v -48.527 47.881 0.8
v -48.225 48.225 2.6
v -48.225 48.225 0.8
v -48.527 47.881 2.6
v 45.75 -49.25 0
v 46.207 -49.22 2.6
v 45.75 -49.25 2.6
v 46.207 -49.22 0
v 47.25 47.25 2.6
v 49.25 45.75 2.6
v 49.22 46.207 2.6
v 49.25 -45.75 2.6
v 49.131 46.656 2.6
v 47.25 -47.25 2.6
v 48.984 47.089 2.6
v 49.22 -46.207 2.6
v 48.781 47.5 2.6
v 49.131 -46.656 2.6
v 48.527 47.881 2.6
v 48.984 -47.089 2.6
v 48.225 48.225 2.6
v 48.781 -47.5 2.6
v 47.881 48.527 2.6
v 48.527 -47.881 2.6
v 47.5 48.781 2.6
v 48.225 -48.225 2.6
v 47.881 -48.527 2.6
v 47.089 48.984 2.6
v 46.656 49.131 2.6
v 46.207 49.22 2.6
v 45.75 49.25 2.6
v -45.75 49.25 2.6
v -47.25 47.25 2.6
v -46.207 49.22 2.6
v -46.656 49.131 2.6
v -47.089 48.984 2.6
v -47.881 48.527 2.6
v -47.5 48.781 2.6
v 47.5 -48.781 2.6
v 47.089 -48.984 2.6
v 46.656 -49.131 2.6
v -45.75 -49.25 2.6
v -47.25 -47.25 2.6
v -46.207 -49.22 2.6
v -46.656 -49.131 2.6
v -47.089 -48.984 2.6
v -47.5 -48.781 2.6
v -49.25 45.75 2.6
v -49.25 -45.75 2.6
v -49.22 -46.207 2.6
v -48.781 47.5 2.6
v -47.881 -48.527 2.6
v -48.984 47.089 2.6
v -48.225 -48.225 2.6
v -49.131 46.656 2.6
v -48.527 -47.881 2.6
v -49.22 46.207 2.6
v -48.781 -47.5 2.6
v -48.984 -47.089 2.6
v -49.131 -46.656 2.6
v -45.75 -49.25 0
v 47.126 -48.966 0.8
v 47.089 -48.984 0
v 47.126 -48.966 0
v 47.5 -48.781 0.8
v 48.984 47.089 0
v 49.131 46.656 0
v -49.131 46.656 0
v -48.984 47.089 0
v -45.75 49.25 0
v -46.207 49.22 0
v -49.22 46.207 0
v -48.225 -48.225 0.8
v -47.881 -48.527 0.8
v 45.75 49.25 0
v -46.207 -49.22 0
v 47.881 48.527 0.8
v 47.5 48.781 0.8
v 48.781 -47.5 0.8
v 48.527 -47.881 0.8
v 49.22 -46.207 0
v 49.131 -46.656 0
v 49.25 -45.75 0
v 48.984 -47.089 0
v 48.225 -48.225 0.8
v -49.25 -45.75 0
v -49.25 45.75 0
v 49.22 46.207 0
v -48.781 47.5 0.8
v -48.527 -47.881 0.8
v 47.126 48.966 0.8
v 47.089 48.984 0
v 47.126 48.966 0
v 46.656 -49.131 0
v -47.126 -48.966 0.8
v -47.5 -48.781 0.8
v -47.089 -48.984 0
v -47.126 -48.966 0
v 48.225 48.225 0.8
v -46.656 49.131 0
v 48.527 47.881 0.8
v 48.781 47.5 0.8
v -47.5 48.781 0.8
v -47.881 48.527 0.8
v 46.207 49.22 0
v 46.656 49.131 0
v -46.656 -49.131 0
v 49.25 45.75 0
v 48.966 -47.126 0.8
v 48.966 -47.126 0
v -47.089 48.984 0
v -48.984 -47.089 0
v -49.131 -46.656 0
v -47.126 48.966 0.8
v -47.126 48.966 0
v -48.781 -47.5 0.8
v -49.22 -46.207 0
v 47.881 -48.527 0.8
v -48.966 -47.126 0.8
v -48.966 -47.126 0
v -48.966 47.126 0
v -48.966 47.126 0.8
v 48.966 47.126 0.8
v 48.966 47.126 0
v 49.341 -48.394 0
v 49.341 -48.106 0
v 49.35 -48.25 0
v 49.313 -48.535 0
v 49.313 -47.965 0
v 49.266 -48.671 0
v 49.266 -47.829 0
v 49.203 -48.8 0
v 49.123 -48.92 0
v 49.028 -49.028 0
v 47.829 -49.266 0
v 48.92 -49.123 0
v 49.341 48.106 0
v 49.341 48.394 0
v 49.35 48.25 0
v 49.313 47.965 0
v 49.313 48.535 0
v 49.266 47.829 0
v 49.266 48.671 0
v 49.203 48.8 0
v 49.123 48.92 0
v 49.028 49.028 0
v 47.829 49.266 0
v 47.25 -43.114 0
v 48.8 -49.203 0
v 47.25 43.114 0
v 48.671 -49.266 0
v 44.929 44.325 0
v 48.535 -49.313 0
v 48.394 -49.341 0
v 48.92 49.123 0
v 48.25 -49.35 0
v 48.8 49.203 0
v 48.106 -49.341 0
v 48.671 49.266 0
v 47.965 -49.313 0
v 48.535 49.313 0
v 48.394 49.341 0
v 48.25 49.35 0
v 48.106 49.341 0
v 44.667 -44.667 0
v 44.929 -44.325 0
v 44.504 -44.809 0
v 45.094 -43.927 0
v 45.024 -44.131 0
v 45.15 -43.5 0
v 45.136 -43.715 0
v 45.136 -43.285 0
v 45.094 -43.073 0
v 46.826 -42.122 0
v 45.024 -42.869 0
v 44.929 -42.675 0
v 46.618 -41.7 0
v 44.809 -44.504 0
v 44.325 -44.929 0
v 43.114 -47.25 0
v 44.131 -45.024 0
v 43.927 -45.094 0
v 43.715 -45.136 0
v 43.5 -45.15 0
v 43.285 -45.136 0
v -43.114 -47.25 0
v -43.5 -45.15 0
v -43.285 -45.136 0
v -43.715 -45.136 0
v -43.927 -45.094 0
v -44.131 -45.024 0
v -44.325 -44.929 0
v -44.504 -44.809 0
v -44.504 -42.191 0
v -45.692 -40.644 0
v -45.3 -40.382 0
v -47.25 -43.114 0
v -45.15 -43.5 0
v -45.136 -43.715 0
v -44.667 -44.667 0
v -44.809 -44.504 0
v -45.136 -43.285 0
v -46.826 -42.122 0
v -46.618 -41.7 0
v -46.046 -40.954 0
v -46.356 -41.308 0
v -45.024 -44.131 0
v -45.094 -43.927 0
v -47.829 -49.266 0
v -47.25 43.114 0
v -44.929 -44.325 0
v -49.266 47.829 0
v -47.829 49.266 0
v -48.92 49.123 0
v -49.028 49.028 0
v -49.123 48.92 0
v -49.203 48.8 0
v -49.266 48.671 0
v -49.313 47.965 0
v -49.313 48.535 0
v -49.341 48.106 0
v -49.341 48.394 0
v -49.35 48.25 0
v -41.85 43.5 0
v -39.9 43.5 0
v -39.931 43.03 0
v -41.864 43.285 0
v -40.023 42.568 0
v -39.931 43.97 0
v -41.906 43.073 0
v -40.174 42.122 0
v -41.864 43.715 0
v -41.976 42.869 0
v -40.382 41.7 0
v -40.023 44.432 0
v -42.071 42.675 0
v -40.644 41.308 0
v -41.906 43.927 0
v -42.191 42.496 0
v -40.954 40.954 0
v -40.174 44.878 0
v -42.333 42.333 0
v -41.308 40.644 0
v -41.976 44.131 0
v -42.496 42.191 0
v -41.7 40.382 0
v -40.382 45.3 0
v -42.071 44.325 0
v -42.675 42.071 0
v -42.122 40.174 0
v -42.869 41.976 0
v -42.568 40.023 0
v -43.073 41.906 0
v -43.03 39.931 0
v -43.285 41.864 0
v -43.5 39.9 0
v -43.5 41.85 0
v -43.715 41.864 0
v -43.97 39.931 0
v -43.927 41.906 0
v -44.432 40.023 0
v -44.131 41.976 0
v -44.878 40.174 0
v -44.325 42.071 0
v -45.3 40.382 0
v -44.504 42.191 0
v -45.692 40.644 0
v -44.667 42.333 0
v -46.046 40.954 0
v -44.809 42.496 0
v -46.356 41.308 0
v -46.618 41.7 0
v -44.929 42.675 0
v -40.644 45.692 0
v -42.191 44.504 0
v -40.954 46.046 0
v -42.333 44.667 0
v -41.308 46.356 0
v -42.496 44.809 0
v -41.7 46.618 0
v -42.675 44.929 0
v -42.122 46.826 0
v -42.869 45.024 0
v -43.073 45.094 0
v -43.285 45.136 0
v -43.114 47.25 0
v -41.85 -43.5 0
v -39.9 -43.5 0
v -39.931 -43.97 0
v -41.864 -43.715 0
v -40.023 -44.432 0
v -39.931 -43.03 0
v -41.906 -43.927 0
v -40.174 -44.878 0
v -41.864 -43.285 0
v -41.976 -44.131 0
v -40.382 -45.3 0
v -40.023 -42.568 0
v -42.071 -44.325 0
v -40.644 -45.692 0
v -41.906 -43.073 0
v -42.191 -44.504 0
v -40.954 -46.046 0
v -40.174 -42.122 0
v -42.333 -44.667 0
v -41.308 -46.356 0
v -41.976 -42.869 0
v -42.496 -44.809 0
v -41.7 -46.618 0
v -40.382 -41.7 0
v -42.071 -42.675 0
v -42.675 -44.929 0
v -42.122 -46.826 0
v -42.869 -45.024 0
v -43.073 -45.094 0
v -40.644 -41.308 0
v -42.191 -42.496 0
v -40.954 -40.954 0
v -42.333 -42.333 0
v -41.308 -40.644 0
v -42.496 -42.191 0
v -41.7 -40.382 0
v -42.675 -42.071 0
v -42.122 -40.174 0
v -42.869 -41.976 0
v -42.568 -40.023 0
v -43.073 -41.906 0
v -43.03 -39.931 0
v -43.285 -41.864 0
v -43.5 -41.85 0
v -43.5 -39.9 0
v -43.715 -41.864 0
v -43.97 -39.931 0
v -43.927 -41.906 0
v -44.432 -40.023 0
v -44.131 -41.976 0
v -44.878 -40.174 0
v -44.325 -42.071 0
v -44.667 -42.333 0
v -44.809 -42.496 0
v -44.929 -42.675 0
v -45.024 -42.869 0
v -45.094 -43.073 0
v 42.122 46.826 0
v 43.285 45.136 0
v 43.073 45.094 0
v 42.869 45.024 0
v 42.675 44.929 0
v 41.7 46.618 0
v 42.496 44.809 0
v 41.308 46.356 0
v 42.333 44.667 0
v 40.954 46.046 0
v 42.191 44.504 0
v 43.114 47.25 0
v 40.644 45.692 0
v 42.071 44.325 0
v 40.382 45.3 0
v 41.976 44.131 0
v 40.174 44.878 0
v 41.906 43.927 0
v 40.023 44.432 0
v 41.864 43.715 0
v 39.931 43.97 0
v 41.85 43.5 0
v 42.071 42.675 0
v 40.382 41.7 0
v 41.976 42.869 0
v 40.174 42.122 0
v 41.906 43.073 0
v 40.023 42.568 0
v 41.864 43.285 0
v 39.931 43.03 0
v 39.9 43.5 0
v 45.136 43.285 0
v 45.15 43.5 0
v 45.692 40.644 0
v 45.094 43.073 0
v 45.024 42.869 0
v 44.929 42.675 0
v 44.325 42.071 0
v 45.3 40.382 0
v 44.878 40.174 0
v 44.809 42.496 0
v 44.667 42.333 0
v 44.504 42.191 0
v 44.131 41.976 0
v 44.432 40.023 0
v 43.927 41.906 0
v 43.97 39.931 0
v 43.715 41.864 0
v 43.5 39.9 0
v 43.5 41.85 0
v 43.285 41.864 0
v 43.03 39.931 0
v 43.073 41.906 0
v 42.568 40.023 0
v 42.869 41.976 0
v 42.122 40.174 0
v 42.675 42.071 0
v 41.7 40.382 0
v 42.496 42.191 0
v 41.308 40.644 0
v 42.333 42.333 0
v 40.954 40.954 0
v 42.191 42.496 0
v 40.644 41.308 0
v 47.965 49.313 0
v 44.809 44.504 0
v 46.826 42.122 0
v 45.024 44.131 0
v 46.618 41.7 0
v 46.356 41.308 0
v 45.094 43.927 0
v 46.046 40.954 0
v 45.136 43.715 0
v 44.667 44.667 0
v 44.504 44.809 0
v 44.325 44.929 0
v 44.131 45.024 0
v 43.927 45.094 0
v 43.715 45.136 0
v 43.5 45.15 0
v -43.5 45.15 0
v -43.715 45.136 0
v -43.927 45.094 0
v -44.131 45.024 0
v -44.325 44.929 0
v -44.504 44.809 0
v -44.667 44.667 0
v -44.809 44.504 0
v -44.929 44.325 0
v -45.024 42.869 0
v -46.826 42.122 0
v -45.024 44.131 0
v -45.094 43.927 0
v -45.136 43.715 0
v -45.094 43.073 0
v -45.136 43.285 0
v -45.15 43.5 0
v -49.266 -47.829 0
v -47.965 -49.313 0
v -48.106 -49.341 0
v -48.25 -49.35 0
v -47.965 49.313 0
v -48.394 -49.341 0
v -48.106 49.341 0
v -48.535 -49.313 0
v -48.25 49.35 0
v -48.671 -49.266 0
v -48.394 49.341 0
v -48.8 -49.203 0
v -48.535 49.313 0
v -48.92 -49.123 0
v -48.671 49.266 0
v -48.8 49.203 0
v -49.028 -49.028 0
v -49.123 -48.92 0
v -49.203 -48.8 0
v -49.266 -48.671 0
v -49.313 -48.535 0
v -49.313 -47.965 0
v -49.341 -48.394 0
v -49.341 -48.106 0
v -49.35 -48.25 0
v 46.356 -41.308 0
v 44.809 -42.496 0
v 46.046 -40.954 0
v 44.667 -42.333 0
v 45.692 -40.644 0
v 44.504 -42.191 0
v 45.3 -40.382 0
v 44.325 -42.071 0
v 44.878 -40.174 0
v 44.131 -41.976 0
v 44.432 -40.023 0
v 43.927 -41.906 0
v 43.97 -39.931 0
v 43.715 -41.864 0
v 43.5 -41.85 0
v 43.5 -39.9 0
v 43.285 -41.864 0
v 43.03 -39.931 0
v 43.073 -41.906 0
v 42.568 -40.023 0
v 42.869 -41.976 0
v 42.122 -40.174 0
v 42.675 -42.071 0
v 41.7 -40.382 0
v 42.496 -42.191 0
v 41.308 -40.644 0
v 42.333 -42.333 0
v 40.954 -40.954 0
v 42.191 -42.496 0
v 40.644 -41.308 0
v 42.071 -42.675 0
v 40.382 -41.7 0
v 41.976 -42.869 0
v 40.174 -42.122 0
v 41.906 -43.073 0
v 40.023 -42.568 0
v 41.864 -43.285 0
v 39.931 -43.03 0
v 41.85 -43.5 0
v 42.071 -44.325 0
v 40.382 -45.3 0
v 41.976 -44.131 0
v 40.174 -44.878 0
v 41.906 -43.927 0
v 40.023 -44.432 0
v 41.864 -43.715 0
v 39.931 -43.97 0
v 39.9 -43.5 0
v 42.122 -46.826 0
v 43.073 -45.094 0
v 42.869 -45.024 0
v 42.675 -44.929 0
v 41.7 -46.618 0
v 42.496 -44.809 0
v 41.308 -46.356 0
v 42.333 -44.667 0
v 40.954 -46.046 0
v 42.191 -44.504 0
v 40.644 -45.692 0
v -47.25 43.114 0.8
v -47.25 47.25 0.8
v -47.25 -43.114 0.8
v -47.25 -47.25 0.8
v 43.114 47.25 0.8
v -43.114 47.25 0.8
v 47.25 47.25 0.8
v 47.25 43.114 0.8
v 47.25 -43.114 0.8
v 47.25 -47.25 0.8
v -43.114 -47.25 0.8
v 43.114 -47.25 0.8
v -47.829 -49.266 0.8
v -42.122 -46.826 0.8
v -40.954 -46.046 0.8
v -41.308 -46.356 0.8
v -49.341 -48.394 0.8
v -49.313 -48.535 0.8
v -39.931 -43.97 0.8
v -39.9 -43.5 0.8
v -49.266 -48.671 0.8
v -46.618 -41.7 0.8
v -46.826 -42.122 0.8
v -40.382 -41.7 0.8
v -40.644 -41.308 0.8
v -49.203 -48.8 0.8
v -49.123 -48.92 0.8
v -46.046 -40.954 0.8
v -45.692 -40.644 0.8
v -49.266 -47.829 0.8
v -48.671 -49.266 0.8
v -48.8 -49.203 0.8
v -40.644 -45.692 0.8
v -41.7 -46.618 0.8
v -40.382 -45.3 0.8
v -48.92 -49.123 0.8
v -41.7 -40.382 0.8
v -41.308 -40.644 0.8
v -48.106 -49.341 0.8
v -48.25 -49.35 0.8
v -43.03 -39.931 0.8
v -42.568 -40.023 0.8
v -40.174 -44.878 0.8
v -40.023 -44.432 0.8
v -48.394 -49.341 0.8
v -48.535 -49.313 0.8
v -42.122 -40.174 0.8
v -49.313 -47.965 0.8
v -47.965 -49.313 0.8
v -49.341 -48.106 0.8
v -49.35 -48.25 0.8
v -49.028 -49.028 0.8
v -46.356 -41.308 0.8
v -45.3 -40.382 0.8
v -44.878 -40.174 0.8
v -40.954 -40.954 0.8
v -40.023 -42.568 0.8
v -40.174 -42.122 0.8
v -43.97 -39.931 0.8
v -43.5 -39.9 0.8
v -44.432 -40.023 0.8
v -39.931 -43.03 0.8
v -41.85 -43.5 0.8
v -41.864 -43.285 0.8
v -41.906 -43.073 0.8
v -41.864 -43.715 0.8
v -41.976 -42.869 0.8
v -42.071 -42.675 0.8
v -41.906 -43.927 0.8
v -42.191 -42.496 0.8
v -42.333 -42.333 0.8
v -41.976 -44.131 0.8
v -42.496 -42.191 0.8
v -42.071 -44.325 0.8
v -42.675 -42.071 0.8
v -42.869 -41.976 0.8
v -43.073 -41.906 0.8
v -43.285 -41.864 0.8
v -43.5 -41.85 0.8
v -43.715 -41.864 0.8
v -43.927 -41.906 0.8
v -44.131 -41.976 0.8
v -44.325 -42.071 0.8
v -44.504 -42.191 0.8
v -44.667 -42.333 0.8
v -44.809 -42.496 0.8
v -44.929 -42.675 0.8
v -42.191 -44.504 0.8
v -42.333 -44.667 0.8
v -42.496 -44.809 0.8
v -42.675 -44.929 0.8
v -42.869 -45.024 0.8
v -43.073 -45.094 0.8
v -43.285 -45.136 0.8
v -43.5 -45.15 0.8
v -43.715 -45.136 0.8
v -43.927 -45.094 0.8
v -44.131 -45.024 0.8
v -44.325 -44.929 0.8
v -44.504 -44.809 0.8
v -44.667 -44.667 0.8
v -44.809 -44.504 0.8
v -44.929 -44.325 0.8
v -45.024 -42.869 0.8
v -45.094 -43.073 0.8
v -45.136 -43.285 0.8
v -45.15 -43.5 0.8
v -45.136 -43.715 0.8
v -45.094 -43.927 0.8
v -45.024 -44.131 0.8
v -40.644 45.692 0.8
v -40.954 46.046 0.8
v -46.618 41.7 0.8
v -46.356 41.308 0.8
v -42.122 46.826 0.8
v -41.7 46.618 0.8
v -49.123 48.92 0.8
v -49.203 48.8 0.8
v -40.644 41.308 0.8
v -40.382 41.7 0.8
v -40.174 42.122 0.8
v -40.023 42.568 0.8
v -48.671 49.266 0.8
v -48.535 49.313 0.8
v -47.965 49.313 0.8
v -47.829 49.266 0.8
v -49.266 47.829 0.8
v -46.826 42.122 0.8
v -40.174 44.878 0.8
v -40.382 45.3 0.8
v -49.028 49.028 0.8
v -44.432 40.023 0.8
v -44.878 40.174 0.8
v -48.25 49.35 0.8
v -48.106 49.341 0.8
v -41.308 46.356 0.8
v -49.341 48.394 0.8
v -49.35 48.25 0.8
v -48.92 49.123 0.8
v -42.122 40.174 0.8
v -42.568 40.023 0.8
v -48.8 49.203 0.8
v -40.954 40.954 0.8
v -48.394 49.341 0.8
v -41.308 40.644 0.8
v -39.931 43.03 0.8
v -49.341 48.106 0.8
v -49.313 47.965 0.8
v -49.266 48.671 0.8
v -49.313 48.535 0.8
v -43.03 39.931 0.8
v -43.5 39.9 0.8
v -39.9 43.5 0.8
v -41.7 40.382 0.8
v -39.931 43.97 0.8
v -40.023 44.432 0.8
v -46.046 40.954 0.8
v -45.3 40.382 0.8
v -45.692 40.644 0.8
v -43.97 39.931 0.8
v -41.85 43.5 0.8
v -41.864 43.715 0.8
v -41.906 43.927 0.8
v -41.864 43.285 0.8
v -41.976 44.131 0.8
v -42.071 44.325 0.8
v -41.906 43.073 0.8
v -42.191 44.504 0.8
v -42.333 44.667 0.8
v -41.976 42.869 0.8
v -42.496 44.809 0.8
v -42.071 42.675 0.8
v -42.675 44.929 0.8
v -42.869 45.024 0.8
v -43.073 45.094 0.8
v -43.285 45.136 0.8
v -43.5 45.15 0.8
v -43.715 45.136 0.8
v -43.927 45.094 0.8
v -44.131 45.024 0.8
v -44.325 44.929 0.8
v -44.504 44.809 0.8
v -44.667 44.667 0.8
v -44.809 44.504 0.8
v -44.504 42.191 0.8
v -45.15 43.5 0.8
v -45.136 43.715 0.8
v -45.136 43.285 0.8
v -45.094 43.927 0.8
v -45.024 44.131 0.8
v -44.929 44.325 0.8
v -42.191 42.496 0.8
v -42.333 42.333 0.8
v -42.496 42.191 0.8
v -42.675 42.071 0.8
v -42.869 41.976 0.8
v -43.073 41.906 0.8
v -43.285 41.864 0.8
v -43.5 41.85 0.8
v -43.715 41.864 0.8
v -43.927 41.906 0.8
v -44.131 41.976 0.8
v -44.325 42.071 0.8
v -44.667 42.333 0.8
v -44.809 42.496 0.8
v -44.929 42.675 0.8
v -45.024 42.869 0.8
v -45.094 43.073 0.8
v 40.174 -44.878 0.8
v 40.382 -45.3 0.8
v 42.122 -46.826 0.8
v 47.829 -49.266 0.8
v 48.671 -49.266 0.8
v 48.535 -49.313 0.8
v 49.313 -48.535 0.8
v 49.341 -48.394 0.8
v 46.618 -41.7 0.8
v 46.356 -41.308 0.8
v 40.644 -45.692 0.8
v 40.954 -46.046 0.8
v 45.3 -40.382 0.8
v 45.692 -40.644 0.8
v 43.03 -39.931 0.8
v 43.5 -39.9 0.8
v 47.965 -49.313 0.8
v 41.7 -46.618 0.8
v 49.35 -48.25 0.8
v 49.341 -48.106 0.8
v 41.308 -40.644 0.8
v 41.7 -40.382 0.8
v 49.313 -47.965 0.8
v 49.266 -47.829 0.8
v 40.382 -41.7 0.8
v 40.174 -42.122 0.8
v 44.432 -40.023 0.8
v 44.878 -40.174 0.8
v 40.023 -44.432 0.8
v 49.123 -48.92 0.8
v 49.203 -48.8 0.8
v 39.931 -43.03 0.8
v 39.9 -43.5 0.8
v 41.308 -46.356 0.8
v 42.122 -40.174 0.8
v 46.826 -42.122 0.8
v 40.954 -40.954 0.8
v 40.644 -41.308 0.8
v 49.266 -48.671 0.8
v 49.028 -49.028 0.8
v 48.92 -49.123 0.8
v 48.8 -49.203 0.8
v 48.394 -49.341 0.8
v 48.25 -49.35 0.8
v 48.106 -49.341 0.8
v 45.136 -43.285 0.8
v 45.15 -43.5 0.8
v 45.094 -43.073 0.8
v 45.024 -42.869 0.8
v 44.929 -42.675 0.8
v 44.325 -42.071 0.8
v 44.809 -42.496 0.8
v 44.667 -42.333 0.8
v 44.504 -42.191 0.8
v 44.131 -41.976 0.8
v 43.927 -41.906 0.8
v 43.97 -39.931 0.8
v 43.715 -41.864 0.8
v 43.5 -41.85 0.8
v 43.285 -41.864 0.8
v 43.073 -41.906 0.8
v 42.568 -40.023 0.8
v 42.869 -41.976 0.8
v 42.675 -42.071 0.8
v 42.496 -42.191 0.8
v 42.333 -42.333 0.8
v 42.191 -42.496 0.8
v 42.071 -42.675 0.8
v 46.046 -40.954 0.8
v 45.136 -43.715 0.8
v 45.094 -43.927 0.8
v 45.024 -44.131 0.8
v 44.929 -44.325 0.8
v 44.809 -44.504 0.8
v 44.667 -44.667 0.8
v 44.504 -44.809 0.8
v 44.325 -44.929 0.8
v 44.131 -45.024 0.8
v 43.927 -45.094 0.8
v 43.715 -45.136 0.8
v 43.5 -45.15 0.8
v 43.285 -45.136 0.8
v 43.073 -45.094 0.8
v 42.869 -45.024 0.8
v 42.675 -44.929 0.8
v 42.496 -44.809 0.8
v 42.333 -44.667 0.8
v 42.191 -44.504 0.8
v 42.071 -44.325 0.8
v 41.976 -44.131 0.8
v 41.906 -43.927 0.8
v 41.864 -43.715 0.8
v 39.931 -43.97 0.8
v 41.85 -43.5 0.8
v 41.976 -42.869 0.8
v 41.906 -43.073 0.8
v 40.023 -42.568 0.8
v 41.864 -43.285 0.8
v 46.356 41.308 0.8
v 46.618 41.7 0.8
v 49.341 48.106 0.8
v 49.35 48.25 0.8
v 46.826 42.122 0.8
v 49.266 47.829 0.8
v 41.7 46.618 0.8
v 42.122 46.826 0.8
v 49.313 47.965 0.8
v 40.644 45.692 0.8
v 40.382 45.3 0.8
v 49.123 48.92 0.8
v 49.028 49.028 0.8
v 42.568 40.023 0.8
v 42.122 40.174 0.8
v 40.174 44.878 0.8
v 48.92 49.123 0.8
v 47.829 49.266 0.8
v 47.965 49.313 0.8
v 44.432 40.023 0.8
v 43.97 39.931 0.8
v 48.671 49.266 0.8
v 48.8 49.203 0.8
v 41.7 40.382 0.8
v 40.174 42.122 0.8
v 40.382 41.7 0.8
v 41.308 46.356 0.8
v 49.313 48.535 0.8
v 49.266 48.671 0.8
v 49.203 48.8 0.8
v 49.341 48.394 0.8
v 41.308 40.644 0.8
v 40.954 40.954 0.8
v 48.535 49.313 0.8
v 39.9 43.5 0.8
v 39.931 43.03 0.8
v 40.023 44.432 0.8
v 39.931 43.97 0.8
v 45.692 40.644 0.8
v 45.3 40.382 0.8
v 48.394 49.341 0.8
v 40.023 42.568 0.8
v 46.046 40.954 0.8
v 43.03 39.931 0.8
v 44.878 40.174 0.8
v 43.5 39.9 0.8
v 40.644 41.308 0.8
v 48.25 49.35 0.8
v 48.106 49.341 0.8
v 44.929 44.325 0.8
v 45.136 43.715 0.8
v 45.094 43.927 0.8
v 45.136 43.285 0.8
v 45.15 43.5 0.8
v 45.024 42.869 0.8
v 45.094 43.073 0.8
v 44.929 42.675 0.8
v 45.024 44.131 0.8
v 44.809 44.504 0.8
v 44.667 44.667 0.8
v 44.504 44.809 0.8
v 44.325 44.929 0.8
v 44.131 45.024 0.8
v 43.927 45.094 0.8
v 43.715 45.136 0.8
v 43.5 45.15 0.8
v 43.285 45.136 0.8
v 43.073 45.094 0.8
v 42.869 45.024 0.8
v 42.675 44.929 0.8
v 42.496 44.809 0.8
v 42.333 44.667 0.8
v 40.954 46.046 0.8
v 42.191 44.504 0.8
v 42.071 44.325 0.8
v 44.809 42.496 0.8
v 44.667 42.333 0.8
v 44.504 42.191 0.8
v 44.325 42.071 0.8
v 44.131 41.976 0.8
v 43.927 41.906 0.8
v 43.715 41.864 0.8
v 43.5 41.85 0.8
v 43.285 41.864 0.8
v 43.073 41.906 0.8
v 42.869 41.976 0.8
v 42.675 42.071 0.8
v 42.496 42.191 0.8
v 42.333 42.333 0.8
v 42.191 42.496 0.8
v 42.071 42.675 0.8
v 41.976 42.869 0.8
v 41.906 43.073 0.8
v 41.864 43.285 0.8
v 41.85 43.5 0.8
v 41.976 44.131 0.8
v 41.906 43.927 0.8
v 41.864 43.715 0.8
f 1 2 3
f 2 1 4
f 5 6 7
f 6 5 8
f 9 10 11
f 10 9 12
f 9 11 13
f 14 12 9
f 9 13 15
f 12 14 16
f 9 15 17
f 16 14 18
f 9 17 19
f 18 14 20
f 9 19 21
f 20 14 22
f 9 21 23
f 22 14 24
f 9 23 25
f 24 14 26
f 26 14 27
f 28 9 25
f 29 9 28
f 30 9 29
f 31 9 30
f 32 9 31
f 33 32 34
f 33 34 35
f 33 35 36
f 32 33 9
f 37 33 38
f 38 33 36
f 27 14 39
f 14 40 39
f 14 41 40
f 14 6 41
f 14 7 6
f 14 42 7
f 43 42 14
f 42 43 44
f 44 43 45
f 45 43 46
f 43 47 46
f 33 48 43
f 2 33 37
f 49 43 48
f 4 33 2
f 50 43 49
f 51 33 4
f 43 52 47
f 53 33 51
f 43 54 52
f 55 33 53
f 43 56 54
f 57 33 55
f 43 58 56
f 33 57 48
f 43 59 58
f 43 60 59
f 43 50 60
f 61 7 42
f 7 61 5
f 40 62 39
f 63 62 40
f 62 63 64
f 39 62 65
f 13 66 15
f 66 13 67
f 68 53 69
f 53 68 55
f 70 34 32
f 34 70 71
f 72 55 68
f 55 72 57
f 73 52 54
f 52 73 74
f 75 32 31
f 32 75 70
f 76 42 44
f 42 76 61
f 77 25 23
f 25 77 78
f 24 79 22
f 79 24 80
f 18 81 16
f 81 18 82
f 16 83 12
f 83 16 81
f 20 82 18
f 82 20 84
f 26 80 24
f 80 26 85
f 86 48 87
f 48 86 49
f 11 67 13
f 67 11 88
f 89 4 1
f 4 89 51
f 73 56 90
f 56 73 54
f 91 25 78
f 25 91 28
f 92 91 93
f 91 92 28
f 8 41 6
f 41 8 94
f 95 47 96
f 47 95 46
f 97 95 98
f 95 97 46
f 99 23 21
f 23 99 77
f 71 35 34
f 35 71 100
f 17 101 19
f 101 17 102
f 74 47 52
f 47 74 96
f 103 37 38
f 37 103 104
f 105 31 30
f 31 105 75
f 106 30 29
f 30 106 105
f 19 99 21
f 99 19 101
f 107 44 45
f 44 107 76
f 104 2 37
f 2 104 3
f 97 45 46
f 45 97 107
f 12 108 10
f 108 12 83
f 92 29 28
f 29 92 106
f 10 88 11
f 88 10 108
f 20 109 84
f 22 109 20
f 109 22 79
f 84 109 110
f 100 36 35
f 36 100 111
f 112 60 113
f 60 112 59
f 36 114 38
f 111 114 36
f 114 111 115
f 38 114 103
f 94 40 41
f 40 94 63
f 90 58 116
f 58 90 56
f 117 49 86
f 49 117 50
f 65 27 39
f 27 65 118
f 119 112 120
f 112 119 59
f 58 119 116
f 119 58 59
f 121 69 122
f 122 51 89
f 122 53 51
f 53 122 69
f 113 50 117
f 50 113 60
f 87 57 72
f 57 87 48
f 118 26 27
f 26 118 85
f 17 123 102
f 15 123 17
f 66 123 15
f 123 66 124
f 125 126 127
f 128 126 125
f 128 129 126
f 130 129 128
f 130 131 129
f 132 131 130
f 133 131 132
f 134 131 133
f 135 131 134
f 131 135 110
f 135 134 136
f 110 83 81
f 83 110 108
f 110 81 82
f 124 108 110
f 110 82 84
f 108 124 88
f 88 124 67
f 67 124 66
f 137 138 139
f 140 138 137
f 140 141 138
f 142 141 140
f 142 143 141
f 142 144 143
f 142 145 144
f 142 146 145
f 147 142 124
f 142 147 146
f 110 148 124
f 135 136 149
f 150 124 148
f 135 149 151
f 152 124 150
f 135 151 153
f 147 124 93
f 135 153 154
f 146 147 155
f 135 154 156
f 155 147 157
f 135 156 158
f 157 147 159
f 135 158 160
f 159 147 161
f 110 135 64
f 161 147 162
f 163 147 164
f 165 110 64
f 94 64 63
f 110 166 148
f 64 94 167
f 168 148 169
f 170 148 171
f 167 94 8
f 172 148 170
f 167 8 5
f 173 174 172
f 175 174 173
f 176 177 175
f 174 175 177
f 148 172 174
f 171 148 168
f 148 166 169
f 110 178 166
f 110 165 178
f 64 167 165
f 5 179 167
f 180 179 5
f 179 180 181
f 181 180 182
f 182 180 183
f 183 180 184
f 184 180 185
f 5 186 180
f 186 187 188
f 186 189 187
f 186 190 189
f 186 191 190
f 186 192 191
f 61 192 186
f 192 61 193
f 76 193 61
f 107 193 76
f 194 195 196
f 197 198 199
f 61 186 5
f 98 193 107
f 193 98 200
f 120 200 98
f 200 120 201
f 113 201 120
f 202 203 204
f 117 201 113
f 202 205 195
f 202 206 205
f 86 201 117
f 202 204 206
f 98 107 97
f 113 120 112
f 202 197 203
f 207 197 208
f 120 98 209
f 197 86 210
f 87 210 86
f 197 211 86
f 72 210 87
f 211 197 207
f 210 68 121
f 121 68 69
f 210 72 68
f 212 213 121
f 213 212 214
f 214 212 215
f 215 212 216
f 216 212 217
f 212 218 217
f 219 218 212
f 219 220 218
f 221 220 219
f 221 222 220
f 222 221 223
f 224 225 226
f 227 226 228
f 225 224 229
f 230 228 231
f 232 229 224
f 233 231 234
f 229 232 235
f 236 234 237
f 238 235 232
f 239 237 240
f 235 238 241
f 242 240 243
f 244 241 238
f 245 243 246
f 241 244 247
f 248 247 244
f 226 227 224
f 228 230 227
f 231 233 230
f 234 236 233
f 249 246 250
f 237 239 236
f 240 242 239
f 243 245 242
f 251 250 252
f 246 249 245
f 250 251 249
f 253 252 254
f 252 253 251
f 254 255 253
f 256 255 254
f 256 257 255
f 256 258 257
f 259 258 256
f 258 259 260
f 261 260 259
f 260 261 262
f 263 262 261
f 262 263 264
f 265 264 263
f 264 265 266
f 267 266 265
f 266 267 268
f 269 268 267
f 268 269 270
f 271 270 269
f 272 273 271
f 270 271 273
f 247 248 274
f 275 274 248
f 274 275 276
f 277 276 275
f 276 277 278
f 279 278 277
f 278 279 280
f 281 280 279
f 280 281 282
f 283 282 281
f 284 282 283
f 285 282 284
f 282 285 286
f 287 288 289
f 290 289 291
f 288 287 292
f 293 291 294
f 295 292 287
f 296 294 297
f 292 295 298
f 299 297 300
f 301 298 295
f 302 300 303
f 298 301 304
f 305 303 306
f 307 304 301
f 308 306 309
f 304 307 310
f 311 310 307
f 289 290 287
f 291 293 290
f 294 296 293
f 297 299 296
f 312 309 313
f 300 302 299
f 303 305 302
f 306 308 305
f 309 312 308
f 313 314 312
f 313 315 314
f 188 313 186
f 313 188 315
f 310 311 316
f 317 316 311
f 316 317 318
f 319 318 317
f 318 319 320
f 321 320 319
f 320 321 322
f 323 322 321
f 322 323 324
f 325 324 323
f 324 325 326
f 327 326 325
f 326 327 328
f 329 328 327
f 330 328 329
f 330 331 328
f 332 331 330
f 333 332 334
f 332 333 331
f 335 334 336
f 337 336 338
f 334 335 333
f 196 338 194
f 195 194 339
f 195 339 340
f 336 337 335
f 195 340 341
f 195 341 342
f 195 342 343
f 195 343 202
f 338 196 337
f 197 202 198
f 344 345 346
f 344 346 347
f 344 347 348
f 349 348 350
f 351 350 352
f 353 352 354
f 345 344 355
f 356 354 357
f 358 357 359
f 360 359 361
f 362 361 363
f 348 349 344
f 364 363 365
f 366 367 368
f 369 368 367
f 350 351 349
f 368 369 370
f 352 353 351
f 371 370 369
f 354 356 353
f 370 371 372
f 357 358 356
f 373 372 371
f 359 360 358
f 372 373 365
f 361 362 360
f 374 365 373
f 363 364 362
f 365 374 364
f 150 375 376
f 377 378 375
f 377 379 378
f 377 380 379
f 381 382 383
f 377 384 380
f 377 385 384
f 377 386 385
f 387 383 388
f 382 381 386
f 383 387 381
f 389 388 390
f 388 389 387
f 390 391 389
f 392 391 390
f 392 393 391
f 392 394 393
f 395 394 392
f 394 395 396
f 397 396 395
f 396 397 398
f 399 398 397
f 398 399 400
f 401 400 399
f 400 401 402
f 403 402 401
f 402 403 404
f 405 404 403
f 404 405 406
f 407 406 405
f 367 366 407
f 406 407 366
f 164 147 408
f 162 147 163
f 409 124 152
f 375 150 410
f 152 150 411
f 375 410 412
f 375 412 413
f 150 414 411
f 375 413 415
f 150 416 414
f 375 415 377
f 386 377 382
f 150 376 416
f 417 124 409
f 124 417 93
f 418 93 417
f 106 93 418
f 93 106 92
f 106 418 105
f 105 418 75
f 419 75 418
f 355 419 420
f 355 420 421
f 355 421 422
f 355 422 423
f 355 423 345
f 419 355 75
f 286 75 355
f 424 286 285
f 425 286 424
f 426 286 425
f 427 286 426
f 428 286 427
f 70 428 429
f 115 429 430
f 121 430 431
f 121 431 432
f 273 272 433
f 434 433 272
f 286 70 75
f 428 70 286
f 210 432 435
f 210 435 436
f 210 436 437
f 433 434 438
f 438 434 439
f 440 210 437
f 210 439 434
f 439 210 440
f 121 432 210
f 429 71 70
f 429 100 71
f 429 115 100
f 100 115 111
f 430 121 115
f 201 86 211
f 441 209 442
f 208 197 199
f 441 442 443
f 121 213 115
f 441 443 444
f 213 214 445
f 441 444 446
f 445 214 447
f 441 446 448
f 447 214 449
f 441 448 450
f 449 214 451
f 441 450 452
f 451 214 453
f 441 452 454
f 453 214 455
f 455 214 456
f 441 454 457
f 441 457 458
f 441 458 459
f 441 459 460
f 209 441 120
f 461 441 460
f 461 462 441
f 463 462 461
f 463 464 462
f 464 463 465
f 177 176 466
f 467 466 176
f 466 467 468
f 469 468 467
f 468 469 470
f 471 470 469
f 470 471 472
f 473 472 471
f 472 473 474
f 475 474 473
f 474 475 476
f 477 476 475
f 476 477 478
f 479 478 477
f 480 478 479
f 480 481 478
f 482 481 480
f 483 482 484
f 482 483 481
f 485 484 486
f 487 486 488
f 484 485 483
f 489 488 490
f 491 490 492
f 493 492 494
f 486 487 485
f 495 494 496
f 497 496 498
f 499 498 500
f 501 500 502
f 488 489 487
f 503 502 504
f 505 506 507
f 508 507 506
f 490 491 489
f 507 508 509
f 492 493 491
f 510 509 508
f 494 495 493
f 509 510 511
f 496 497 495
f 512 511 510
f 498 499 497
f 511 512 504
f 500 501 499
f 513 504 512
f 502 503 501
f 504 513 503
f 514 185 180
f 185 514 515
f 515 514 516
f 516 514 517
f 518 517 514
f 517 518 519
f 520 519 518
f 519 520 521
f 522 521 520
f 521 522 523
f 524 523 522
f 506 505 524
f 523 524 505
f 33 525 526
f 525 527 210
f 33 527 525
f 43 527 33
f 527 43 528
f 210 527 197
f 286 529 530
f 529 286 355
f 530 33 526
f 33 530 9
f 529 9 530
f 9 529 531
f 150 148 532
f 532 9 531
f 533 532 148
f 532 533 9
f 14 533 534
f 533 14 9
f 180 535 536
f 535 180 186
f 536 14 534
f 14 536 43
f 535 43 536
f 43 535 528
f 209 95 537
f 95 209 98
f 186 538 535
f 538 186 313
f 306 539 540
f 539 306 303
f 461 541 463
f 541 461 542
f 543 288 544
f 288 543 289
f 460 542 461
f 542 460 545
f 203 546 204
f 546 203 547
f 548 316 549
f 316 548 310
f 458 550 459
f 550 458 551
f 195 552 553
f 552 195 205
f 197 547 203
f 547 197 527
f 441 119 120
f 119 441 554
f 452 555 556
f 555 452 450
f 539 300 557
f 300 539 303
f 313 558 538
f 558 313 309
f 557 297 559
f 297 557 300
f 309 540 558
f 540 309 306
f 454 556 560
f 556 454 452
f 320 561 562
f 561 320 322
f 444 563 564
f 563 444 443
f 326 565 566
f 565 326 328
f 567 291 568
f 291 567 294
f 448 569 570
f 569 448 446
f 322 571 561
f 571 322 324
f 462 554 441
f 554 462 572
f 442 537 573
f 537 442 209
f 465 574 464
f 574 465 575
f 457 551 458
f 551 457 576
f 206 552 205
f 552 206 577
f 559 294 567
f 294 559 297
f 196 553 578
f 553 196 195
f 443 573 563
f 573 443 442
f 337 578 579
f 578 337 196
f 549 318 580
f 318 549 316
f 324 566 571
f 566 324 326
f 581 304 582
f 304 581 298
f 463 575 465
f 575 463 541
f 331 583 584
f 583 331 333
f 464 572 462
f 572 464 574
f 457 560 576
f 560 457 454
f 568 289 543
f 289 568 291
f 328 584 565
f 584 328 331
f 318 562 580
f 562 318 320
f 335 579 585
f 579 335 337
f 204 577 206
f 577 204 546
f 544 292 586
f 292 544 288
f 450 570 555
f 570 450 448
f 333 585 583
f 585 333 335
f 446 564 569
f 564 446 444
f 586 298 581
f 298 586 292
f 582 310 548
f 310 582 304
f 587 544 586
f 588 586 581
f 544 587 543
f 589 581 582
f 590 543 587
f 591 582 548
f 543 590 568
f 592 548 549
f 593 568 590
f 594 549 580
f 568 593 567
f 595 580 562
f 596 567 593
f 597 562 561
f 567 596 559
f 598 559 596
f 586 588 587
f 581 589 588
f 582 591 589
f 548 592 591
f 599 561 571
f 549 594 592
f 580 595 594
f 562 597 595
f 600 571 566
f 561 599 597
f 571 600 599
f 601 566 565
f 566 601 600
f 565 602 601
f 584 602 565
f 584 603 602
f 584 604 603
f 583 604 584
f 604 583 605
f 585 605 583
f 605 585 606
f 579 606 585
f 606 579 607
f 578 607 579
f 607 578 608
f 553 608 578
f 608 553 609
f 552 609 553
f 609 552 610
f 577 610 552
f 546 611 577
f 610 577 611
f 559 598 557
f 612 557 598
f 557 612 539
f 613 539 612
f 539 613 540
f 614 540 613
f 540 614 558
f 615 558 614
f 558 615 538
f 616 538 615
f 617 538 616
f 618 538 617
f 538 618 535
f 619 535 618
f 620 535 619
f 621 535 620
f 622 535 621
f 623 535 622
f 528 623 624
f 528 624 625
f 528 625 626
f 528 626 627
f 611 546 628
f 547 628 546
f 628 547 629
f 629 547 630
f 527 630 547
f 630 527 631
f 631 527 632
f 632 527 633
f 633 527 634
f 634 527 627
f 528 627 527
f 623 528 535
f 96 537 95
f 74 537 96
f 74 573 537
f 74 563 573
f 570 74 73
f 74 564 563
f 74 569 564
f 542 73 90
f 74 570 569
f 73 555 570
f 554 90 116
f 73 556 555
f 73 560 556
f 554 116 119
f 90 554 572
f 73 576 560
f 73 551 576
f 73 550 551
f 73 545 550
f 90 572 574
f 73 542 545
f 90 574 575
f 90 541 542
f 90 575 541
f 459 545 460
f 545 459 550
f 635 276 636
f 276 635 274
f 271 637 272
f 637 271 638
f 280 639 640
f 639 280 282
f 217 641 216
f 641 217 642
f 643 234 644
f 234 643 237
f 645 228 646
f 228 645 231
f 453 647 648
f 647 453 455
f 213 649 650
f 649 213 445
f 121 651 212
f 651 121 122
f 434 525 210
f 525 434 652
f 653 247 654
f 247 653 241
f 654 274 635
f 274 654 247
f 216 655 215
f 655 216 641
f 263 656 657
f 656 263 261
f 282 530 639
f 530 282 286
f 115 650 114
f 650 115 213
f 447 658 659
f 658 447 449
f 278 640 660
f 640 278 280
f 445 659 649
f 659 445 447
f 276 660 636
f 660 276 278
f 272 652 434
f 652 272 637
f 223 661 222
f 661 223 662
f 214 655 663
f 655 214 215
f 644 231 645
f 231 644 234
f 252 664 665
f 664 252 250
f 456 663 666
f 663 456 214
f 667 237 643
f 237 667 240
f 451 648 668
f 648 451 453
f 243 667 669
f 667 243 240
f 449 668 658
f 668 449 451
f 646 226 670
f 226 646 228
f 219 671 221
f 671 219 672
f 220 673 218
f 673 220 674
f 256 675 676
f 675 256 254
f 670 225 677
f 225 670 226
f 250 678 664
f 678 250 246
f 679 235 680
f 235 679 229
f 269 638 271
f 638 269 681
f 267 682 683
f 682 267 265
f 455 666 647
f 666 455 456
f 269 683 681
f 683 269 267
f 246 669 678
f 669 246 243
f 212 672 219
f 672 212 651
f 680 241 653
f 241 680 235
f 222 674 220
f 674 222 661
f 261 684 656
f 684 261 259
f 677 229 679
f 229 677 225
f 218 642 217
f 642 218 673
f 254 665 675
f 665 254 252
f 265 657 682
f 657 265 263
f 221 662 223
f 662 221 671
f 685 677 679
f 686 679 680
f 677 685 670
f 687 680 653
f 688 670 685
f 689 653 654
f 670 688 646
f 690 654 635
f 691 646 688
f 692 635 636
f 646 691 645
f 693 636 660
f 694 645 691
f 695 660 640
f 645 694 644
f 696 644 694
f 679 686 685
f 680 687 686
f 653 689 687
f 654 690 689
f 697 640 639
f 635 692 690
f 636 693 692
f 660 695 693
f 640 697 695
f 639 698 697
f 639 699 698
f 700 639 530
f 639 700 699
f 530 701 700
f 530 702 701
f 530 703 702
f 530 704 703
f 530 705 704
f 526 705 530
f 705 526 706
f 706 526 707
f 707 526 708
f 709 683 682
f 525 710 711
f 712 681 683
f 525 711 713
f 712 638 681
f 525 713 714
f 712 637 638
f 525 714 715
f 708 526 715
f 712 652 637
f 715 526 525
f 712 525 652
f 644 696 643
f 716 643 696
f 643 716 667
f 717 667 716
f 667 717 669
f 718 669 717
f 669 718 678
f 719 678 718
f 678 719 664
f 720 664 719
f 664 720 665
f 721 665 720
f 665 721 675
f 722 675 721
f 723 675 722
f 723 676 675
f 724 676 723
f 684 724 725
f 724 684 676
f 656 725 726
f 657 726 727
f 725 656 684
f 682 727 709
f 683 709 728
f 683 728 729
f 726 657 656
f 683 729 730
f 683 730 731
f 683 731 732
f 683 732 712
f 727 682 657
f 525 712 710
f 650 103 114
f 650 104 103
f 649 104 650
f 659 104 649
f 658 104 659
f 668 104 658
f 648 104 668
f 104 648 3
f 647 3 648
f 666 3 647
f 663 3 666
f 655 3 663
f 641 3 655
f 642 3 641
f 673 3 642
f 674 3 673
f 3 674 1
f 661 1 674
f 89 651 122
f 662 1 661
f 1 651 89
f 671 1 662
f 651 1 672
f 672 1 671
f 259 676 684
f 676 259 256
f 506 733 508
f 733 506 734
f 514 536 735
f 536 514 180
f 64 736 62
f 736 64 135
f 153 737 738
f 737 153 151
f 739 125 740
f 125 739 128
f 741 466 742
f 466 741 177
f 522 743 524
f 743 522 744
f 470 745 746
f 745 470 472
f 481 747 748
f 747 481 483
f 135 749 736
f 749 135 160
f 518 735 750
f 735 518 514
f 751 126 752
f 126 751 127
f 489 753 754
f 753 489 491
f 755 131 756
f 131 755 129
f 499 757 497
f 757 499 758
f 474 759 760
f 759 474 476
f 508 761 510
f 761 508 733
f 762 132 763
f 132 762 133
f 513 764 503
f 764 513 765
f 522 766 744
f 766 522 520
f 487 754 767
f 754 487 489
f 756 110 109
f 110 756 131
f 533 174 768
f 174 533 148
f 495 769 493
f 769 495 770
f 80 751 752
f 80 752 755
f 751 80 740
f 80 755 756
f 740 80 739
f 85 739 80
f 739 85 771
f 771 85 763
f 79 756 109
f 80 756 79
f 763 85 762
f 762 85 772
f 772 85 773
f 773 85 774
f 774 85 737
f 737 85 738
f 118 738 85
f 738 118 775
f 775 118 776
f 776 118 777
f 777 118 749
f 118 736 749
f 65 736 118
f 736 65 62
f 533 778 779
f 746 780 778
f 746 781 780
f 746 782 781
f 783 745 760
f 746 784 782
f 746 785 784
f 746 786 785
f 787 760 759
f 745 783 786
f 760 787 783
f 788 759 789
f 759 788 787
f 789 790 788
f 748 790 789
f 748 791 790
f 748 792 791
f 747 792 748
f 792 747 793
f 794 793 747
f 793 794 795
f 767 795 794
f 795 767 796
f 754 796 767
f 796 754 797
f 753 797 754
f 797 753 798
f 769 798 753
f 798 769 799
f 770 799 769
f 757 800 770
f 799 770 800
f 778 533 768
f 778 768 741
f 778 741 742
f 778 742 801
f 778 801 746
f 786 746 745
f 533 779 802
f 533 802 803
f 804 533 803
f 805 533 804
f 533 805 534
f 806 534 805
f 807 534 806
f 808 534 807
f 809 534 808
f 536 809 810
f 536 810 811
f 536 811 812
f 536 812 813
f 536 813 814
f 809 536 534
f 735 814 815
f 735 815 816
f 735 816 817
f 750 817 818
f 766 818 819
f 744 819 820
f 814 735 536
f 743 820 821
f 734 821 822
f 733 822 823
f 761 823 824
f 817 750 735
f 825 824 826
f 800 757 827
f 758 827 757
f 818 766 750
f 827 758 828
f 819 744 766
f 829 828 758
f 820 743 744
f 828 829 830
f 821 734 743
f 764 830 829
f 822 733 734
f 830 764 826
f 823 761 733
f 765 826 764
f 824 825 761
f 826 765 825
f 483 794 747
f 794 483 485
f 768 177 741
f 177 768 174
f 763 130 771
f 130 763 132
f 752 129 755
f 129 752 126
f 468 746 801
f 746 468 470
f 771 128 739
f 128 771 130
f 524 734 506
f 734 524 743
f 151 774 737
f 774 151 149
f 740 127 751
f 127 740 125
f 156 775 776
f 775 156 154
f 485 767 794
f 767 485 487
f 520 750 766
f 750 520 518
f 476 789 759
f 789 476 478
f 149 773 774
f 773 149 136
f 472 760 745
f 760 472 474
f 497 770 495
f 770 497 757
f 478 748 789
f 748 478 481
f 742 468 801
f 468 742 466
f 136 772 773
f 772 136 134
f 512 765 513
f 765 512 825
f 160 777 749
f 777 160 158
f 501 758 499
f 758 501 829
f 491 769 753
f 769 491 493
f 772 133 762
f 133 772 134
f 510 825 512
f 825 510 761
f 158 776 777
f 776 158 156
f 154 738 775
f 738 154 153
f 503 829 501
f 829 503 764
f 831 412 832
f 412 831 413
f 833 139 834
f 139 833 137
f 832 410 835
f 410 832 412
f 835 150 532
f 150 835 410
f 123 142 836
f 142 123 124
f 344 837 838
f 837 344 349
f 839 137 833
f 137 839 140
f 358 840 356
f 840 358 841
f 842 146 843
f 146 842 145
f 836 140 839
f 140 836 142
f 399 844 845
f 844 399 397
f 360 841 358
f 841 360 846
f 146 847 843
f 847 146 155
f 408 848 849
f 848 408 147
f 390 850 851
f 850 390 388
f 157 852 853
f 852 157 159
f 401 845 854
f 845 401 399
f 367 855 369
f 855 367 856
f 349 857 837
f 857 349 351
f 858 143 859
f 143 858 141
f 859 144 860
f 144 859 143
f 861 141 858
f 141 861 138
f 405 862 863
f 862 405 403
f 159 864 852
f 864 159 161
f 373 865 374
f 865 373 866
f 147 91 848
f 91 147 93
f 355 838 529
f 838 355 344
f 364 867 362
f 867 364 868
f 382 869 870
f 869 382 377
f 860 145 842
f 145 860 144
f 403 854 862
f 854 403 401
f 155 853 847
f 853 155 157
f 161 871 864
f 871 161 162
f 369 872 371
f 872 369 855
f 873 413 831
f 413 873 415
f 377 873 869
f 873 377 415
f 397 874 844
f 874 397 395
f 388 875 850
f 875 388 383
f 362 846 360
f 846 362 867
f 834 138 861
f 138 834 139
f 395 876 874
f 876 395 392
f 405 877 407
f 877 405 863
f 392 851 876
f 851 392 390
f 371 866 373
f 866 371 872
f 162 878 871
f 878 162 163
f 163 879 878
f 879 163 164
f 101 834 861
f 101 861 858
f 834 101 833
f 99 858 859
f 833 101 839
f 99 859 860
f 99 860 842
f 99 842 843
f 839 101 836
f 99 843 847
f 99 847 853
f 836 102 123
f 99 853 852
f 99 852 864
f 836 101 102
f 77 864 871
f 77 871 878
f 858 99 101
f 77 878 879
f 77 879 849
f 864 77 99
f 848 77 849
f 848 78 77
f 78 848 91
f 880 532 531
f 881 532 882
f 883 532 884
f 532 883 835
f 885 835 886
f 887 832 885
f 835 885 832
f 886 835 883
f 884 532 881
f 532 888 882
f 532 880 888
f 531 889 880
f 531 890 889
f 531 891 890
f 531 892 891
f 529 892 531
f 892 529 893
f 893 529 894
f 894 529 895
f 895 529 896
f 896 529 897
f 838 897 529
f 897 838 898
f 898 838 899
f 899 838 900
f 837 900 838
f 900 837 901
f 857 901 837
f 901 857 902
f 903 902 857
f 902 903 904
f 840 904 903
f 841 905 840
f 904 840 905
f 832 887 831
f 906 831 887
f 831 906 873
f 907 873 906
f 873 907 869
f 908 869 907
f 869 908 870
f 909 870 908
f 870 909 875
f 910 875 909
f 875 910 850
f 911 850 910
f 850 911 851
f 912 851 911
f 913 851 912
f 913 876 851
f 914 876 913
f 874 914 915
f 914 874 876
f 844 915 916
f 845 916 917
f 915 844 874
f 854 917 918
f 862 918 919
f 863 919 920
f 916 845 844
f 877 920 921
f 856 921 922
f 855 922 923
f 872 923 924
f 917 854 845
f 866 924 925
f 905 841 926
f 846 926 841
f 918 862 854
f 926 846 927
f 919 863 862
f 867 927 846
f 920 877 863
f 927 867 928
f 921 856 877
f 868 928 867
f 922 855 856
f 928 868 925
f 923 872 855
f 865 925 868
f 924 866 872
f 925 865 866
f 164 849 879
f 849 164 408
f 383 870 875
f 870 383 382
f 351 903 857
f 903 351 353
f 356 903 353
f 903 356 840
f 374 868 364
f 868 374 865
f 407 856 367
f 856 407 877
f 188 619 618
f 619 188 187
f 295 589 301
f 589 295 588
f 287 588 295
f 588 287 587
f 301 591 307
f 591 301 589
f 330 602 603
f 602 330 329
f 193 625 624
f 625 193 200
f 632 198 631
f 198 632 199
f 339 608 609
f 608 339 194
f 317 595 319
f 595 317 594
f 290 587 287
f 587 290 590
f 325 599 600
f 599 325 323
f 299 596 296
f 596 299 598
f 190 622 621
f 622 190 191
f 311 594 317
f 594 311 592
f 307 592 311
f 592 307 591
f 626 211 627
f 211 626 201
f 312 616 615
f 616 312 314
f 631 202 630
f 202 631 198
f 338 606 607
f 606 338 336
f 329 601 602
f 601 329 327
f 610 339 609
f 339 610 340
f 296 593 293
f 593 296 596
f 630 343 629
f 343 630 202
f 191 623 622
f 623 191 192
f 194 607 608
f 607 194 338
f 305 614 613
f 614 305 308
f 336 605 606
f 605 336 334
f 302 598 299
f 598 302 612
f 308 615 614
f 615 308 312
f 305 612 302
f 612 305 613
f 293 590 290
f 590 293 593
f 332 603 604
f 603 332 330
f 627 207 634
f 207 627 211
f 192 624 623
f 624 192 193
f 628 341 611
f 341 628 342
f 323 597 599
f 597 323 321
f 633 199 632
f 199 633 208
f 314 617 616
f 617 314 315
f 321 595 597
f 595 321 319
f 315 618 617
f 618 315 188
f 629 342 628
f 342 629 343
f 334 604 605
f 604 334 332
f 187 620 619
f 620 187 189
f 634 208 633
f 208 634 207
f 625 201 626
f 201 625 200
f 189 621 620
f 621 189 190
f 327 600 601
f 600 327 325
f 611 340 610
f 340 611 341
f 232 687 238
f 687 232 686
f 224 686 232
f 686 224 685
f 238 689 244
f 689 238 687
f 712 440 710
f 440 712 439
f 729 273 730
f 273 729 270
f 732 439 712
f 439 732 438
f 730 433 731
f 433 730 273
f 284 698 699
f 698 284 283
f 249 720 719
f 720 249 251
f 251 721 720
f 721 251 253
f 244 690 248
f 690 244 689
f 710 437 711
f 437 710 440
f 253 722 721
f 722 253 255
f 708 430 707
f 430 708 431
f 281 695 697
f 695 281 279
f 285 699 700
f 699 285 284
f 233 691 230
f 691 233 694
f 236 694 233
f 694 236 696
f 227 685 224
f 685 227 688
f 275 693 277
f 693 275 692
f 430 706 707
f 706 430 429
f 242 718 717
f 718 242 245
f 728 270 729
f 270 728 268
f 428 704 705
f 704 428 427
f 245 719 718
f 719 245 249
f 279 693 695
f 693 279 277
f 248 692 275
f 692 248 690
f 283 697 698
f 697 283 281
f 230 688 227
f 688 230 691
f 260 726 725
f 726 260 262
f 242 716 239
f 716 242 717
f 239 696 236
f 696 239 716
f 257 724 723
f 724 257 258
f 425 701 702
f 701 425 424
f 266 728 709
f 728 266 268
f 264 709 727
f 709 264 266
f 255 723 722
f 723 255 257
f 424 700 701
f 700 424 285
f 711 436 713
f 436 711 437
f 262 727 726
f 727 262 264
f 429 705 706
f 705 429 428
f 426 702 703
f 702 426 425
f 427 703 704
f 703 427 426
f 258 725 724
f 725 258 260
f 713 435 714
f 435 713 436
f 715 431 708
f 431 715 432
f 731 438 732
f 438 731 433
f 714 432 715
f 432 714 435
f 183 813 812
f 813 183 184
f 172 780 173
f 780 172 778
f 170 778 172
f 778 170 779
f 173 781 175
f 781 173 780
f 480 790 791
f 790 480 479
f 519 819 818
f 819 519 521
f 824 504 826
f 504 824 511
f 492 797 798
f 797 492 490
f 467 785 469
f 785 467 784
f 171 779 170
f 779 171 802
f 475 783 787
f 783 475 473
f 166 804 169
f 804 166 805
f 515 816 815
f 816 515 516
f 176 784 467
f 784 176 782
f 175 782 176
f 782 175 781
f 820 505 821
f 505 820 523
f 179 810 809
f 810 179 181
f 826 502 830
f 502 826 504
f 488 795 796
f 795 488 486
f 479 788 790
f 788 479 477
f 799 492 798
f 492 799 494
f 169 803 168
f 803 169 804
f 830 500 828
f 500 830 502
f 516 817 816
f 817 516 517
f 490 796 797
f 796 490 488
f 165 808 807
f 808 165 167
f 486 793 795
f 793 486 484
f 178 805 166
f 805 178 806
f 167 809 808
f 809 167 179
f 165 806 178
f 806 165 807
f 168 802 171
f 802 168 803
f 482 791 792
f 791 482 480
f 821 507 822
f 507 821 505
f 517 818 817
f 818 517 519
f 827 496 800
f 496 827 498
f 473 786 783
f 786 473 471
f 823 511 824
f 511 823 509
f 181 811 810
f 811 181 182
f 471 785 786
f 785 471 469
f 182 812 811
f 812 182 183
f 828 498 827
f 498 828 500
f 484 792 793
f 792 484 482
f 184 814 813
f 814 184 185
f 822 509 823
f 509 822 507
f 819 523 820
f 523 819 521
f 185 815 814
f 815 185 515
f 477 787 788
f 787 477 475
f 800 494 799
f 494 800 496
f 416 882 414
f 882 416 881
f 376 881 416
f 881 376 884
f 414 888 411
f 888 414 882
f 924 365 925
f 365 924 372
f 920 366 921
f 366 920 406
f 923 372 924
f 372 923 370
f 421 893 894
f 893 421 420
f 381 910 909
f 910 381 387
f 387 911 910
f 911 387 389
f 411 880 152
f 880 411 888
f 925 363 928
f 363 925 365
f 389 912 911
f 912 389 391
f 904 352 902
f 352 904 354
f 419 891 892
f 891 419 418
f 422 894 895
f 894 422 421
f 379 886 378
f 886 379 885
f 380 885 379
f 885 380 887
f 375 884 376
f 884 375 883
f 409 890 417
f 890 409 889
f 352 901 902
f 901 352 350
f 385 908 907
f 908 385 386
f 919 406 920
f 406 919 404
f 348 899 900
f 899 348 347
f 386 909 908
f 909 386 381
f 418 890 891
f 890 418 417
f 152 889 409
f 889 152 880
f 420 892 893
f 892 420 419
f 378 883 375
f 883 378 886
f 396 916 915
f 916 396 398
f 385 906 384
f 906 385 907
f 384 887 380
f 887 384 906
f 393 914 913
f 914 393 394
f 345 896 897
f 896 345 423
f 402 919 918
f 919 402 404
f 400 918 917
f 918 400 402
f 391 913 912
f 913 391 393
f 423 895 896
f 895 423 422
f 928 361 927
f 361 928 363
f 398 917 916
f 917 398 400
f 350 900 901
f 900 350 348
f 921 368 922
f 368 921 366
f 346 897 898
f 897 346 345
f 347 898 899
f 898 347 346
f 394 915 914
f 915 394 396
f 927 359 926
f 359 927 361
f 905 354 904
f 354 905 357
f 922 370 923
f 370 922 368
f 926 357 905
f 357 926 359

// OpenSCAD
// Independent copy of the existing screen V3 fit coupon, dimensions unchanged.
use <azoria-touch-v3-source.scad>
$fn=72;
fit_gauge();
